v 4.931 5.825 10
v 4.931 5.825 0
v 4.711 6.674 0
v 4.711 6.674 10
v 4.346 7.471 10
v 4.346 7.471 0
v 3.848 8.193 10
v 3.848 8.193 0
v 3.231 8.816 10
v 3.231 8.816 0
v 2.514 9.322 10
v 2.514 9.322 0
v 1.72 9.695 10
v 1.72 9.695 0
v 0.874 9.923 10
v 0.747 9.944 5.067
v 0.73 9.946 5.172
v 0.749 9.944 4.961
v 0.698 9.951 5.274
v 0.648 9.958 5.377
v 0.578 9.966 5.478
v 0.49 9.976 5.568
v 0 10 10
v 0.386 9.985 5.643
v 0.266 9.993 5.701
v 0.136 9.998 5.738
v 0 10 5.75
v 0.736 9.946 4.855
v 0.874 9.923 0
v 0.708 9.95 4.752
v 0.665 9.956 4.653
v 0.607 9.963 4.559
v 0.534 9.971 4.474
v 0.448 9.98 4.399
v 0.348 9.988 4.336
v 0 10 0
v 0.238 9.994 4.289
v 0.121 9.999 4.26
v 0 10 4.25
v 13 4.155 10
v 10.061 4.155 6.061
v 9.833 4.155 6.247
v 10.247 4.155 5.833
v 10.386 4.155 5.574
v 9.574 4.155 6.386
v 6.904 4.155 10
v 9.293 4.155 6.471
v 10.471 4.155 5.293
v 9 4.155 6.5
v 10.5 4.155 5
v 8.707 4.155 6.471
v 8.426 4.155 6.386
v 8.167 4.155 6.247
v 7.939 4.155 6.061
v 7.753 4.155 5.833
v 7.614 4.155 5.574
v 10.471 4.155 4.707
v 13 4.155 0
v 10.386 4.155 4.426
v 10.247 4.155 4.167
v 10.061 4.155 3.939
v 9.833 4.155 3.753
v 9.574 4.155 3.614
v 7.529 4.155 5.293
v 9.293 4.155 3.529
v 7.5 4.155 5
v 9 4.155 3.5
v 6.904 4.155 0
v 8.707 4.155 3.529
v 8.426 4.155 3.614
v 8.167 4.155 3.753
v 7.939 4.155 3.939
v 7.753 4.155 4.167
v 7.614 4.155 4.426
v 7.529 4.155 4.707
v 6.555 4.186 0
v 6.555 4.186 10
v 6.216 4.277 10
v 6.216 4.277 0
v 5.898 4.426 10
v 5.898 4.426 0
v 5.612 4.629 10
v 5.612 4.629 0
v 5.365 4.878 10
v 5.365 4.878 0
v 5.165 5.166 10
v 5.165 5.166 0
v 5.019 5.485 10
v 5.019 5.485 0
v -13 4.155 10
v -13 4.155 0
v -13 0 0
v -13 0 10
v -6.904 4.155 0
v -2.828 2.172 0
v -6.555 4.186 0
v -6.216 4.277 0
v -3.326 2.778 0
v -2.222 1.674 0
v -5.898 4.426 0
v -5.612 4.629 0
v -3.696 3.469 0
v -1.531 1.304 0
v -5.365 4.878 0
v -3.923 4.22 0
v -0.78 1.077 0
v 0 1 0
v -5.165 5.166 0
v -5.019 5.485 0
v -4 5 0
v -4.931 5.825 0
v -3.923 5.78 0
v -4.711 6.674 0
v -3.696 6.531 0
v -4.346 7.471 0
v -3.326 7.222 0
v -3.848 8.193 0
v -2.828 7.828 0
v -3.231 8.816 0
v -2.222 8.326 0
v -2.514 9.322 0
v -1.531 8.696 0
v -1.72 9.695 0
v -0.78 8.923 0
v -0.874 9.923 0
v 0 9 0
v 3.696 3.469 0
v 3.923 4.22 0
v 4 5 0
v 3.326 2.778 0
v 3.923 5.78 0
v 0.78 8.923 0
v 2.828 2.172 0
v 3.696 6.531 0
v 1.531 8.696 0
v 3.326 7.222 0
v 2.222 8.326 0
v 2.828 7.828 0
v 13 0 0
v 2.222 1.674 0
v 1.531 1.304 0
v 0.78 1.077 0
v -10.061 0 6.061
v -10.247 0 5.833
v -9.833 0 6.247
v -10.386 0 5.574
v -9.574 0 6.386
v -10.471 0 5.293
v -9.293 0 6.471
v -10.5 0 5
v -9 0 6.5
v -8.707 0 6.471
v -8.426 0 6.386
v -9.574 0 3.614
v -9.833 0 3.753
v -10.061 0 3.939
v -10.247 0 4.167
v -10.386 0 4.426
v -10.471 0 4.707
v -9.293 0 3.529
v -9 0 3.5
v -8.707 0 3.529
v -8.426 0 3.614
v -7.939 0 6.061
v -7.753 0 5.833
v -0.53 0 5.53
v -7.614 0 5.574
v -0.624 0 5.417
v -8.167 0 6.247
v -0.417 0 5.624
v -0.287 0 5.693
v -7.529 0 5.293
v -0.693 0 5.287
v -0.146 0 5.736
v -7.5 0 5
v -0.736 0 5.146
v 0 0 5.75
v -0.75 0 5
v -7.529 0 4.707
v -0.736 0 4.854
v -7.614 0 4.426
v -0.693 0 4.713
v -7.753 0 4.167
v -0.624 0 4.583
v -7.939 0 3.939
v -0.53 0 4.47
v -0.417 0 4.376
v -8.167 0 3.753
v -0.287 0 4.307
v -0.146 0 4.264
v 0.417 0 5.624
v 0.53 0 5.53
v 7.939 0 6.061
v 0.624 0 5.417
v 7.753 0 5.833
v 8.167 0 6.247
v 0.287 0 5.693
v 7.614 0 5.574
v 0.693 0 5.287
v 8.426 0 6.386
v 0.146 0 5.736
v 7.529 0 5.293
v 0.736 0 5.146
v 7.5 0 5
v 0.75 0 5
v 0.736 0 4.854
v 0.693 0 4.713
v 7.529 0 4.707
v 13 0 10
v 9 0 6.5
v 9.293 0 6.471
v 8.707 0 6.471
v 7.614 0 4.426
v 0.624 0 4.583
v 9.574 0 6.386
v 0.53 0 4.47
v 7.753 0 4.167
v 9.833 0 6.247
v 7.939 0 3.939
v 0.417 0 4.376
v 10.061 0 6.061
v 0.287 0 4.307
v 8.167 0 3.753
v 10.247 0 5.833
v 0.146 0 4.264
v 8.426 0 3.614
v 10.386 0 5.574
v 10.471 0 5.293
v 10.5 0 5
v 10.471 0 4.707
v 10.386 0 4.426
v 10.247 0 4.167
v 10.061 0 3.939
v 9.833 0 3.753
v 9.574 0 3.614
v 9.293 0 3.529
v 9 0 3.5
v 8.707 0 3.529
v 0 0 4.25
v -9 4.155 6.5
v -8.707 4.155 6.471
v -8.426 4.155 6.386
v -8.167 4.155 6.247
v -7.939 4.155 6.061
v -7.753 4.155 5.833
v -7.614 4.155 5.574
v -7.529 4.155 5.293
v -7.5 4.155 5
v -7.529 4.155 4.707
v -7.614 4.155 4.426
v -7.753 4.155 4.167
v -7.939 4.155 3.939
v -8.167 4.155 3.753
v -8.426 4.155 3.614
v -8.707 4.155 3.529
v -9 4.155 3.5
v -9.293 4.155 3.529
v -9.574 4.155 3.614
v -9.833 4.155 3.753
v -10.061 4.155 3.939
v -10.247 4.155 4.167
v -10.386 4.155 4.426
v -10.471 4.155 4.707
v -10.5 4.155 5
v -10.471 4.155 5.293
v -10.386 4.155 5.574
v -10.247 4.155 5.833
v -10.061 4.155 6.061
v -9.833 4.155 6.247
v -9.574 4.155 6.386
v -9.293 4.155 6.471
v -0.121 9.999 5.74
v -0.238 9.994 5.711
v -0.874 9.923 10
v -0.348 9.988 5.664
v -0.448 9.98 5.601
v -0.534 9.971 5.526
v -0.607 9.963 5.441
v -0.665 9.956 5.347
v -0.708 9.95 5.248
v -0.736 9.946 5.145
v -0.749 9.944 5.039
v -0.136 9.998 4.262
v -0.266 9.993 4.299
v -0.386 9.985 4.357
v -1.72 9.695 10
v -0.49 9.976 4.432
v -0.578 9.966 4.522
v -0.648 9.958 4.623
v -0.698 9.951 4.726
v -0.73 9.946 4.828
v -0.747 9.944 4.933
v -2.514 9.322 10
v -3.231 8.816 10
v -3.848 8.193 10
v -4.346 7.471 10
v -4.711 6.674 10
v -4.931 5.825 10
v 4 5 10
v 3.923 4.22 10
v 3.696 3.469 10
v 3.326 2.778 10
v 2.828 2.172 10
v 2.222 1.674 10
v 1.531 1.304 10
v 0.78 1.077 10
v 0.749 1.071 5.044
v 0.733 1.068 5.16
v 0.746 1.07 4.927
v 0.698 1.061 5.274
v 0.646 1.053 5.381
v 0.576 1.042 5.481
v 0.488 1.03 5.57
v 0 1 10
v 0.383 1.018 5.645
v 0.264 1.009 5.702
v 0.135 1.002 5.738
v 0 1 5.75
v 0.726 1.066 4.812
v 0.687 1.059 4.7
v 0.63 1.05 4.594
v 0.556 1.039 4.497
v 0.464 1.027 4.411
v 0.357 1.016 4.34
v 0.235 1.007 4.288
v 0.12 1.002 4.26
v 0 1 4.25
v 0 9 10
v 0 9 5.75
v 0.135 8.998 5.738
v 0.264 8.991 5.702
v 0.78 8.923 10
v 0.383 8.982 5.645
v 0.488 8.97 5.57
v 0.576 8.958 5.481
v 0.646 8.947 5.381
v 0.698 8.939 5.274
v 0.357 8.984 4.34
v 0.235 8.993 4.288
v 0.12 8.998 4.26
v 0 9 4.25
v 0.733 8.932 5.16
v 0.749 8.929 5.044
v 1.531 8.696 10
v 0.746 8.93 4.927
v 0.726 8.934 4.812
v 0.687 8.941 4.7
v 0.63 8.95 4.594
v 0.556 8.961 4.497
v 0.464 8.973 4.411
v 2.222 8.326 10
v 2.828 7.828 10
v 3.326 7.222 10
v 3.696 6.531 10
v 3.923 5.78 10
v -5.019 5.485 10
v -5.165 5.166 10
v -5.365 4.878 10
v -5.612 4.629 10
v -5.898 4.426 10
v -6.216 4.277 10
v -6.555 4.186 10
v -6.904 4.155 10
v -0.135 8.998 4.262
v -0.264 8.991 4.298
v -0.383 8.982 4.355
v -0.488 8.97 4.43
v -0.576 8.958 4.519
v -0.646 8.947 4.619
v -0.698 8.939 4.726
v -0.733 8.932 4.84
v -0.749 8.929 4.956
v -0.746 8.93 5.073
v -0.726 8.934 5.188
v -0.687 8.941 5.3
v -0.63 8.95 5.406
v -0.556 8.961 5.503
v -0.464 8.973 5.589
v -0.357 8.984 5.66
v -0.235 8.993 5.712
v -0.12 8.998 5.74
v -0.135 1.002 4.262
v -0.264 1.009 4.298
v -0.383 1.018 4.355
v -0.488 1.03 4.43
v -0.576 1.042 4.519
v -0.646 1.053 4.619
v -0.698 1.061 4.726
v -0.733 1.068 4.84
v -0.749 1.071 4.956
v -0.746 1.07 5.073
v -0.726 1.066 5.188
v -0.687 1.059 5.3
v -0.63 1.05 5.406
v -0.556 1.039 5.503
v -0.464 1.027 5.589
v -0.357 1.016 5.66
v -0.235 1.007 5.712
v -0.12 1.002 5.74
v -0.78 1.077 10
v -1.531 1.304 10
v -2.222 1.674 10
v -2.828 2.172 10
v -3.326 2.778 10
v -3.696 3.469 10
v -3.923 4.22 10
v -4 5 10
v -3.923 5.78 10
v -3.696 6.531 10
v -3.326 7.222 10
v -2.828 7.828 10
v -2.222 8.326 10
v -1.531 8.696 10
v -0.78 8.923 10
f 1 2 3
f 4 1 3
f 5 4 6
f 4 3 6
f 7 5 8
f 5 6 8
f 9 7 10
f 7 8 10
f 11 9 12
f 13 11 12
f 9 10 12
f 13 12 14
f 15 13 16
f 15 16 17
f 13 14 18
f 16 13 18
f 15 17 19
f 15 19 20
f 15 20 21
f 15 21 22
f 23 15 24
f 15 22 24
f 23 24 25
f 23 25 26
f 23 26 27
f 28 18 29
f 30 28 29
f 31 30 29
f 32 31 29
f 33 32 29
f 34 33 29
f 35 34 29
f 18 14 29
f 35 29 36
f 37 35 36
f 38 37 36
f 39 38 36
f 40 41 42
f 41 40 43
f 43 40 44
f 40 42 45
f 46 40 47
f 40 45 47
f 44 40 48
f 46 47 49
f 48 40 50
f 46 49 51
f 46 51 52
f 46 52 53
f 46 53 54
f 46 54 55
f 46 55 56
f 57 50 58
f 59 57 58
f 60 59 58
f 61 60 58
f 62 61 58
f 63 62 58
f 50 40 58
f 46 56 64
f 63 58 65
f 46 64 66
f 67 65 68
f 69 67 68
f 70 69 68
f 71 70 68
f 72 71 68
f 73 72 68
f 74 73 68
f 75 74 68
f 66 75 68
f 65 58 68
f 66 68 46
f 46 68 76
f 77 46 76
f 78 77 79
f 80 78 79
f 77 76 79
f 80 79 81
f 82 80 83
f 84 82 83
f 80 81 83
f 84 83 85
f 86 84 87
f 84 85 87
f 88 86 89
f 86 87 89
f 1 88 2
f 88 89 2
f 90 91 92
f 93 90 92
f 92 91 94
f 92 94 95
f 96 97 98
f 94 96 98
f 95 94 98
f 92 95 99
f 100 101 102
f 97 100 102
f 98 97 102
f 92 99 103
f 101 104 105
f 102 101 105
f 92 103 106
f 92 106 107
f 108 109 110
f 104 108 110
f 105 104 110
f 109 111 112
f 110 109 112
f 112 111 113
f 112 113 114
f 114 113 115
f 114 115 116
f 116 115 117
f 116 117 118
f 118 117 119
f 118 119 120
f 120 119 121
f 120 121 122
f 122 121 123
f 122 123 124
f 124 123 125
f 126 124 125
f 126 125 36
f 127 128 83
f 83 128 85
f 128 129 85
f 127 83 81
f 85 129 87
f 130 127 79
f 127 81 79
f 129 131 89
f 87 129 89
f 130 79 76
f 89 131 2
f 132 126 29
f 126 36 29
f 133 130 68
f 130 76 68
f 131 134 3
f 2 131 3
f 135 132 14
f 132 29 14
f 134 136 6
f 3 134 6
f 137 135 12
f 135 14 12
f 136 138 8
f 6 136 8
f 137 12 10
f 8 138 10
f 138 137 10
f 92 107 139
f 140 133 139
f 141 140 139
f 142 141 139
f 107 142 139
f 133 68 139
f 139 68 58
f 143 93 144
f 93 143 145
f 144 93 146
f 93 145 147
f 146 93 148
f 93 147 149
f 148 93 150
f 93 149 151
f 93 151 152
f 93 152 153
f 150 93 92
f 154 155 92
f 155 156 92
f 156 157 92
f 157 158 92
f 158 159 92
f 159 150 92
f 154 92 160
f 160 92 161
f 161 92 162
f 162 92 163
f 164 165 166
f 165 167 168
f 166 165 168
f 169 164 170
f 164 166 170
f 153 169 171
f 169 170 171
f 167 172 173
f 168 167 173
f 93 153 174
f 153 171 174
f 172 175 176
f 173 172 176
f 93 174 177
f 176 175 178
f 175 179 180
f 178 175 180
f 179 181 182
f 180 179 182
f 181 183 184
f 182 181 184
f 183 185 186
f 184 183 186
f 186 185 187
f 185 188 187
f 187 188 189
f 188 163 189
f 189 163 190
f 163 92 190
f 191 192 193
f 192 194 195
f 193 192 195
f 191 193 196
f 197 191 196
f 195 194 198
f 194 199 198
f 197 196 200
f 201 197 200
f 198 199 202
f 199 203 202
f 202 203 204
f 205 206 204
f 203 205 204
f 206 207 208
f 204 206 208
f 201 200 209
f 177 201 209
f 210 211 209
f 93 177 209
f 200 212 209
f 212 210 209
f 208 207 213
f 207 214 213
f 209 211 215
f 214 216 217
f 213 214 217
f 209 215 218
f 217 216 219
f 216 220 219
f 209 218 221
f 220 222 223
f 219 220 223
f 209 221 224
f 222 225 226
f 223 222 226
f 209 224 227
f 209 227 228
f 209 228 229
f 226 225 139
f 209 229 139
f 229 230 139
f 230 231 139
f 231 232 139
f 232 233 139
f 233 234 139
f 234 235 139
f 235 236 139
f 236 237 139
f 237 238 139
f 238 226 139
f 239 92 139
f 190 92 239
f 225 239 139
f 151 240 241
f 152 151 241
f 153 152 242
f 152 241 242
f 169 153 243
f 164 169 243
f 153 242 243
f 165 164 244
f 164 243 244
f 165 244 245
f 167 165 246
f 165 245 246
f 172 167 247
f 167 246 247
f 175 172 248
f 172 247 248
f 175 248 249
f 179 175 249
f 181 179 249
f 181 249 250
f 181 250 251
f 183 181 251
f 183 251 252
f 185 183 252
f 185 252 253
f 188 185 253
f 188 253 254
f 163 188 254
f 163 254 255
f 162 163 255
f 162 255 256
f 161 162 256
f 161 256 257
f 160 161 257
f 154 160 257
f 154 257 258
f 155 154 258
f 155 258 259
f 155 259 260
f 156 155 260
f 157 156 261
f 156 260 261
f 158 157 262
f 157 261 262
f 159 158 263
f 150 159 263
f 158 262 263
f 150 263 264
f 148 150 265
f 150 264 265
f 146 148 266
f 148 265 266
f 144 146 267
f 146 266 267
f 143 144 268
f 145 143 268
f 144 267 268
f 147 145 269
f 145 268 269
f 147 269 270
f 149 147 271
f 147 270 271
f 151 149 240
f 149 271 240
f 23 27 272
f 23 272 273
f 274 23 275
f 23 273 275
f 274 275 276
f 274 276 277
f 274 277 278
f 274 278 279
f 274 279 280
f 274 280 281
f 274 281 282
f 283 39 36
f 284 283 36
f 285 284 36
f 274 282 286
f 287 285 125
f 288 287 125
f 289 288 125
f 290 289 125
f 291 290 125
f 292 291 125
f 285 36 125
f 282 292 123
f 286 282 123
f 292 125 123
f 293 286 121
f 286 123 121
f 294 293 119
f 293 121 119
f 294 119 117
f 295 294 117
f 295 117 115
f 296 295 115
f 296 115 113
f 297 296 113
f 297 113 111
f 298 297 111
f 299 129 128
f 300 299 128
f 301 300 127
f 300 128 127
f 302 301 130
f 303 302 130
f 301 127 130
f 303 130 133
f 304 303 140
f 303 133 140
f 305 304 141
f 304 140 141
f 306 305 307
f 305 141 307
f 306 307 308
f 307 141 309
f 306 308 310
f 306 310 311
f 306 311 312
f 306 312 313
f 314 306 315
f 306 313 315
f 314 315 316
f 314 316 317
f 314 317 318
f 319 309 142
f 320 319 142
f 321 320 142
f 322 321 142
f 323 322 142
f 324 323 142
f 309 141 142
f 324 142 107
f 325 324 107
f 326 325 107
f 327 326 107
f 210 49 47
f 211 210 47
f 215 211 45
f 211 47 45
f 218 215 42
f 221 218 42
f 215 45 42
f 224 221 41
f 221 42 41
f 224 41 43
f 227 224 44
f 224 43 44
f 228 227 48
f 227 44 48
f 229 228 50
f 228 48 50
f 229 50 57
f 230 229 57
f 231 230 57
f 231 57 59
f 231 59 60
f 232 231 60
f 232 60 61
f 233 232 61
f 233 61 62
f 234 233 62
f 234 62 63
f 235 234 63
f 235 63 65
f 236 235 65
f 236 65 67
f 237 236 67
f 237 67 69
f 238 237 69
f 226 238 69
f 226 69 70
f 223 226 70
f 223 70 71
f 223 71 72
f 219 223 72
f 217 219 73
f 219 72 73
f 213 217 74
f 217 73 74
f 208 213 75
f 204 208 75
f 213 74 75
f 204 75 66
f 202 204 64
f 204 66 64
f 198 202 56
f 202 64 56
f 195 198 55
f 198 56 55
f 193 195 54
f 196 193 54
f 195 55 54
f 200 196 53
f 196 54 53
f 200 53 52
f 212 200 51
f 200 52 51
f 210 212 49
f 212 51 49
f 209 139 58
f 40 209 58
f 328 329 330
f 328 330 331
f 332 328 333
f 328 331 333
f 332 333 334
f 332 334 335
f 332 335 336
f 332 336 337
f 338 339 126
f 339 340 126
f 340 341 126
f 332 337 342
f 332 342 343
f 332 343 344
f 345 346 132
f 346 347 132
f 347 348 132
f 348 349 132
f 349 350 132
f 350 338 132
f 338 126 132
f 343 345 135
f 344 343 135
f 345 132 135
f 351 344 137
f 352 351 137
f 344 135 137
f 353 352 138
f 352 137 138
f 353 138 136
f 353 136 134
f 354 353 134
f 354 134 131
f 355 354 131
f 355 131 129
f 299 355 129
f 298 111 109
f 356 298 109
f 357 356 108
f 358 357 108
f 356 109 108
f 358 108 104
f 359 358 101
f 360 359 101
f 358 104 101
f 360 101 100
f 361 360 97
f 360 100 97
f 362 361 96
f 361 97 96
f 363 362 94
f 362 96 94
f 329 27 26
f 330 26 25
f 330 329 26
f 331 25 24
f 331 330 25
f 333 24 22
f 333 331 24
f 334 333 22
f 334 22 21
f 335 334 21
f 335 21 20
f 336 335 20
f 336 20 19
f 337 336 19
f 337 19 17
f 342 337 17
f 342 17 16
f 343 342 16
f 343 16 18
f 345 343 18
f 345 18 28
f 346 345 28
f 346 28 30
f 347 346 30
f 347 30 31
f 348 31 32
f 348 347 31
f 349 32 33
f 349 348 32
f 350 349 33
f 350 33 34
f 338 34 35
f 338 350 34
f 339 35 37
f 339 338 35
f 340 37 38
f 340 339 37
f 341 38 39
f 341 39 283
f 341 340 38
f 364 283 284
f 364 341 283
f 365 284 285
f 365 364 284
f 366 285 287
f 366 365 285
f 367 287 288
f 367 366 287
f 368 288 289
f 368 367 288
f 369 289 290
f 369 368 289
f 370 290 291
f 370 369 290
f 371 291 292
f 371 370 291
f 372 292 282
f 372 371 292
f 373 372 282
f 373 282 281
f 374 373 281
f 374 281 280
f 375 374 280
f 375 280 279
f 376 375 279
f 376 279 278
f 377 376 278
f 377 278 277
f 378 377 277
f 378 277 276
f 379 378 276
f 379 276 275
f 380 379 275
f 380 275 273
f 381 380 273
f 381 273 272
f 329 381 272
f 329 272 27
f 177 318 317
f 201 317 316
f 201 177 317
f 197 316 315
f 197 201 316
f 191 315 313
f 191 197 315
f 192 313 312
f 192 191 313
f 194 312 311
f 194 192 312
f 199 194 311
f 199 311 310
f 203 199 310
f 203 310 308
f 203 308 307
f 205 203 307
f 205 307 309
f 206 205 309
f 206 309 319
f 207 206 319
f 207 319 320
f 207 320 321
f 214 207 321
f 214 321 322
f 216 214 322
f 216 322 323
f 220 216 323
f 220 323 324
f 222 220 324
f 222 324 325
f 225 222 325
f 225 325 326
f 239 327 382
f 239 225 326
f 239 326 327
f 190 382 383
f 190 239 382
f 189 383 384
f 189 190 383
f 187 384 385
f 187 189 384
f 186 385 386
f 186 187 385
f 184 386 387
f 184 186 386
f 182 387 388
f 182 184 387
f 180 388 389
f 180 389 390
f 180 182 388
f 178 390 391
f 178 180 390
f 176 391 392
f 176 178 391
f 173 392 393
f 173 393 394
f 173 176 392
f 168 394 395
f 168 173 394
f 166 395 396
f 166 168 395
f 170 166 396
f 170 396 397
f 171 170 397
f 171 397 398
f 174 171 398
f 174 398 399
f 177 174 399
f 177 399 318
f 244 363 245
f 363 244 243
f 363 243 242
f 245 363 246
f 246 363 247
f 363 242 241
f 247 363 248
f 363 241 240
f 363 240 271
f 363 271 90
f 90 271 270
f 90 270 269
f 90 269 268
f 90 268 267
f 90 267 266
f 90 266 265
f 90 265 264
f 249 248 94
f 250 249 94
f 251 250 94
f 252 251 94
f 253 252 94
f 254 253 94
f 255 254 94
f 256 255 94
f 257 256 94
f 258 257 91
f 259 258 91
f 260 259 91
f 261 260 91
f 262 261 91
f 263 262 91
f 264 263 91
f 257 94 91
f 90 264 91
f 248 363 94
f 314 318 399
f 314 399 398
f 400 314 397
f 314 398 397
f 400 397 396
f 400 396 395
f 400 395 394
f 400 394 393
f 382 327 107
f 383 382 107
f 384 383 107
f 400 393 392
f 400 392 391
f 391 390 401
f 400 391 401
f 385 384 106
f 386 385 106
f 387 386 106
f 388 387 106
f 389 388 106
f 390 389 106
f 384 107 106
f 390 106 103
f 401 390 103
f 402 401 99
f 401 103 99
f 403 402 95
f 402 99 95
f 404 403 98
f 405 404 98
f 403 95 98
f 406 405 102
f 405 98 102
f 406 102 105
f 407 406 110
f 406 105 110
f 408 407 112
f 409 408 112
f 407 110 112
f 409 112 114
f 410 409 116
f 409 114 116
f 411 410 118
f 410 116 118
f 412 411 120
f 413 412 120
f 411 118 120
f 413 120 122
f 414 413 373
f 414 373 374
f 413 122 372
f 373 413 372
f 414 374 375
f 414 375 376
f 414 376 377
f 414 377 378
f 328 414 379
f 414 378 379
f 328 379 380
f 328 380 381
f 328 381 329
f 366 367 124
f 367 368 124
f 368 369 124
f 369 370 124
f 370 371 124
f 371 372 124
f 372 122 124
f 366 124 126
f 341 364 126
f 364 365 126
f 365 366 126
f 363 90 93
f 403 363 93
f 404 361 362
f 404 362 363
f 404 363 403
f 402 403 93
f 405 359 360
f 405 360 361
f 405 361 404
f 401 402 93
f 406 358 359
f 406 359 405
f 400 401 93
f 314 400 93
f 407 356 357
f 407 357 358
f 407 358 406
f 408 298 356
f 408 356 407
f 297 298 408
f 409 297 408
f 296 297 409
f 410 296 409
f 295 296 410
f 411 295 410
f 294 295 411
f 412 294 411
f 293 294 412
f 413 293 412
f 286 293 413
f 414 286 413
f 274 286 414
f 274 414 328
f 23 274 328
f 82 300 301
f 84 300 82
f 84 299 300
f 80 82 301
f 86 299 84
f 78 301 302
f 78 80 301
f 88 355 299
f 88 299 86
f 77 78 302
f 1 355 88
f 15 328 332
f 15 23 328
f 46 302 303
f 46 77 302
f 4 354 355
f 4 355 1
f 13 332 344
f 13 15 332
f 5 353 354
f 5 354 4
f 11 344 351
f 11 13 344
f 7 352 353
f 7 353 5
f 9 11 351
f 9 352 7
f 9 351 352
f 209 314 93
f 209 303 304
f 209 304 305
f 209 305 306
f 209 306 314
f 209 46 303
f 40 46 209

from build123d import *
from build123d.topology import SkipClean

# Parameters (mm, degrees)
BOSS_EXTRUDE1_DEPTH     = 10
SKETCH2_R               = 1.5
CUT_EXTRUDE1_DEPTH      = 10
CUT_EXTRUDE2_DEPTH      = 18.411616553
CUT_EXTRUDE2_DEPTH_BACK = 18.411616553
SKETCH3_R               = 0.75


with BuildPart() as part:
    # Sketch1 → Boss-Extrude1 (new body)
    with BuildSketch(Plane.XY):
        with BuildLine():
            Line((0, 1), (0, 0))
            Line((0, 0), (13, 0))
            Line((13, 0), (13, 4.154968692))
            Line((13, 4.154968692), (6.904060206, 4.154968692))
            ThreePointArc((6.904060206, 4.154968692), (5.611771946, 4.62853787), (4.931471575, 5.824977637))
            ThreePointArc((4.931471575, 5.824977637), (3.230720648, 8.816077055), (0, 10))
            Line((0, 10), (0, 9))
            ThreePointArc((0, 9), (2.828427125, 7.828427125), (4, 5))
            ThreePointArc((4, 5), (2.828427125, 2.171572875), (0, 1))
        make_face()
        with BuildLine():
            Line((-13, 0), (0, 0))
            Line((0, 0), (0, 1))
            ThreePointArc((0, 1), (-4, 5), (0, 9))
            Line((0, 9), (0, 10))
            ThreePointArc((0, 10), (-3.230720648, 8.816077055), (-4.931471575, 5.824977637))
            ThreePointArc((-4.931471575, 5.824977637), (-5.611771946, 4.62853787), (-6.904060206, 4.154968692))
            Line((-6.904060206, 4.154968692), (-13, 4.154968692))
            Line((-13, 4.154968692), (-13, 0))
        make_face()
    extrude(amount=BOSS_EXTRUDE1_DEPTH)

    # Sketch2 → Cut-Extrude1 (cut)
    with BuildSketch(Plane(origin=(0, 4.154968692, 0), x_dir=(1, 0, 0), z_dir=(0, 1, 0))):
        with Locations(Location((-9, -5, 0), (0, 0, 270))):
            Circle(SKETCH2_R)
        with Locations(Location((9, -5, 0), (0, 0, 270))):
            Circle(SKETCH2_R)
    extrude(amount=-CUT_EXTRUDE1_DEPTH, mode=Mode.SUBTRACT)

    # Sketch3 → Cut-Extrude2 (cut, two sides: drawn at the far end of the back side and taken through both)
    with SkipClean():  # the faces are left unmerged after this step: merging them gives an invalid solid
        with BuildSketch(Plane(origin=(0, 4.154968692, 0), x_dir=(1, 0, 0), z_dir=(0, 1, 0)).offset(-CUT_EXTRUDE2_DEPTH_BACK)):
            with Locations(Location((0, -5, 0), (0, 0, 270))):
                Circle(SKETCH3_R)
        extrude(amount=CUT_EXTRUDE2_DEPTH + CUT_EXTRUDE2_DEPTH_BACK, mode=Mode.SUBTRACT)


solid = part.part
